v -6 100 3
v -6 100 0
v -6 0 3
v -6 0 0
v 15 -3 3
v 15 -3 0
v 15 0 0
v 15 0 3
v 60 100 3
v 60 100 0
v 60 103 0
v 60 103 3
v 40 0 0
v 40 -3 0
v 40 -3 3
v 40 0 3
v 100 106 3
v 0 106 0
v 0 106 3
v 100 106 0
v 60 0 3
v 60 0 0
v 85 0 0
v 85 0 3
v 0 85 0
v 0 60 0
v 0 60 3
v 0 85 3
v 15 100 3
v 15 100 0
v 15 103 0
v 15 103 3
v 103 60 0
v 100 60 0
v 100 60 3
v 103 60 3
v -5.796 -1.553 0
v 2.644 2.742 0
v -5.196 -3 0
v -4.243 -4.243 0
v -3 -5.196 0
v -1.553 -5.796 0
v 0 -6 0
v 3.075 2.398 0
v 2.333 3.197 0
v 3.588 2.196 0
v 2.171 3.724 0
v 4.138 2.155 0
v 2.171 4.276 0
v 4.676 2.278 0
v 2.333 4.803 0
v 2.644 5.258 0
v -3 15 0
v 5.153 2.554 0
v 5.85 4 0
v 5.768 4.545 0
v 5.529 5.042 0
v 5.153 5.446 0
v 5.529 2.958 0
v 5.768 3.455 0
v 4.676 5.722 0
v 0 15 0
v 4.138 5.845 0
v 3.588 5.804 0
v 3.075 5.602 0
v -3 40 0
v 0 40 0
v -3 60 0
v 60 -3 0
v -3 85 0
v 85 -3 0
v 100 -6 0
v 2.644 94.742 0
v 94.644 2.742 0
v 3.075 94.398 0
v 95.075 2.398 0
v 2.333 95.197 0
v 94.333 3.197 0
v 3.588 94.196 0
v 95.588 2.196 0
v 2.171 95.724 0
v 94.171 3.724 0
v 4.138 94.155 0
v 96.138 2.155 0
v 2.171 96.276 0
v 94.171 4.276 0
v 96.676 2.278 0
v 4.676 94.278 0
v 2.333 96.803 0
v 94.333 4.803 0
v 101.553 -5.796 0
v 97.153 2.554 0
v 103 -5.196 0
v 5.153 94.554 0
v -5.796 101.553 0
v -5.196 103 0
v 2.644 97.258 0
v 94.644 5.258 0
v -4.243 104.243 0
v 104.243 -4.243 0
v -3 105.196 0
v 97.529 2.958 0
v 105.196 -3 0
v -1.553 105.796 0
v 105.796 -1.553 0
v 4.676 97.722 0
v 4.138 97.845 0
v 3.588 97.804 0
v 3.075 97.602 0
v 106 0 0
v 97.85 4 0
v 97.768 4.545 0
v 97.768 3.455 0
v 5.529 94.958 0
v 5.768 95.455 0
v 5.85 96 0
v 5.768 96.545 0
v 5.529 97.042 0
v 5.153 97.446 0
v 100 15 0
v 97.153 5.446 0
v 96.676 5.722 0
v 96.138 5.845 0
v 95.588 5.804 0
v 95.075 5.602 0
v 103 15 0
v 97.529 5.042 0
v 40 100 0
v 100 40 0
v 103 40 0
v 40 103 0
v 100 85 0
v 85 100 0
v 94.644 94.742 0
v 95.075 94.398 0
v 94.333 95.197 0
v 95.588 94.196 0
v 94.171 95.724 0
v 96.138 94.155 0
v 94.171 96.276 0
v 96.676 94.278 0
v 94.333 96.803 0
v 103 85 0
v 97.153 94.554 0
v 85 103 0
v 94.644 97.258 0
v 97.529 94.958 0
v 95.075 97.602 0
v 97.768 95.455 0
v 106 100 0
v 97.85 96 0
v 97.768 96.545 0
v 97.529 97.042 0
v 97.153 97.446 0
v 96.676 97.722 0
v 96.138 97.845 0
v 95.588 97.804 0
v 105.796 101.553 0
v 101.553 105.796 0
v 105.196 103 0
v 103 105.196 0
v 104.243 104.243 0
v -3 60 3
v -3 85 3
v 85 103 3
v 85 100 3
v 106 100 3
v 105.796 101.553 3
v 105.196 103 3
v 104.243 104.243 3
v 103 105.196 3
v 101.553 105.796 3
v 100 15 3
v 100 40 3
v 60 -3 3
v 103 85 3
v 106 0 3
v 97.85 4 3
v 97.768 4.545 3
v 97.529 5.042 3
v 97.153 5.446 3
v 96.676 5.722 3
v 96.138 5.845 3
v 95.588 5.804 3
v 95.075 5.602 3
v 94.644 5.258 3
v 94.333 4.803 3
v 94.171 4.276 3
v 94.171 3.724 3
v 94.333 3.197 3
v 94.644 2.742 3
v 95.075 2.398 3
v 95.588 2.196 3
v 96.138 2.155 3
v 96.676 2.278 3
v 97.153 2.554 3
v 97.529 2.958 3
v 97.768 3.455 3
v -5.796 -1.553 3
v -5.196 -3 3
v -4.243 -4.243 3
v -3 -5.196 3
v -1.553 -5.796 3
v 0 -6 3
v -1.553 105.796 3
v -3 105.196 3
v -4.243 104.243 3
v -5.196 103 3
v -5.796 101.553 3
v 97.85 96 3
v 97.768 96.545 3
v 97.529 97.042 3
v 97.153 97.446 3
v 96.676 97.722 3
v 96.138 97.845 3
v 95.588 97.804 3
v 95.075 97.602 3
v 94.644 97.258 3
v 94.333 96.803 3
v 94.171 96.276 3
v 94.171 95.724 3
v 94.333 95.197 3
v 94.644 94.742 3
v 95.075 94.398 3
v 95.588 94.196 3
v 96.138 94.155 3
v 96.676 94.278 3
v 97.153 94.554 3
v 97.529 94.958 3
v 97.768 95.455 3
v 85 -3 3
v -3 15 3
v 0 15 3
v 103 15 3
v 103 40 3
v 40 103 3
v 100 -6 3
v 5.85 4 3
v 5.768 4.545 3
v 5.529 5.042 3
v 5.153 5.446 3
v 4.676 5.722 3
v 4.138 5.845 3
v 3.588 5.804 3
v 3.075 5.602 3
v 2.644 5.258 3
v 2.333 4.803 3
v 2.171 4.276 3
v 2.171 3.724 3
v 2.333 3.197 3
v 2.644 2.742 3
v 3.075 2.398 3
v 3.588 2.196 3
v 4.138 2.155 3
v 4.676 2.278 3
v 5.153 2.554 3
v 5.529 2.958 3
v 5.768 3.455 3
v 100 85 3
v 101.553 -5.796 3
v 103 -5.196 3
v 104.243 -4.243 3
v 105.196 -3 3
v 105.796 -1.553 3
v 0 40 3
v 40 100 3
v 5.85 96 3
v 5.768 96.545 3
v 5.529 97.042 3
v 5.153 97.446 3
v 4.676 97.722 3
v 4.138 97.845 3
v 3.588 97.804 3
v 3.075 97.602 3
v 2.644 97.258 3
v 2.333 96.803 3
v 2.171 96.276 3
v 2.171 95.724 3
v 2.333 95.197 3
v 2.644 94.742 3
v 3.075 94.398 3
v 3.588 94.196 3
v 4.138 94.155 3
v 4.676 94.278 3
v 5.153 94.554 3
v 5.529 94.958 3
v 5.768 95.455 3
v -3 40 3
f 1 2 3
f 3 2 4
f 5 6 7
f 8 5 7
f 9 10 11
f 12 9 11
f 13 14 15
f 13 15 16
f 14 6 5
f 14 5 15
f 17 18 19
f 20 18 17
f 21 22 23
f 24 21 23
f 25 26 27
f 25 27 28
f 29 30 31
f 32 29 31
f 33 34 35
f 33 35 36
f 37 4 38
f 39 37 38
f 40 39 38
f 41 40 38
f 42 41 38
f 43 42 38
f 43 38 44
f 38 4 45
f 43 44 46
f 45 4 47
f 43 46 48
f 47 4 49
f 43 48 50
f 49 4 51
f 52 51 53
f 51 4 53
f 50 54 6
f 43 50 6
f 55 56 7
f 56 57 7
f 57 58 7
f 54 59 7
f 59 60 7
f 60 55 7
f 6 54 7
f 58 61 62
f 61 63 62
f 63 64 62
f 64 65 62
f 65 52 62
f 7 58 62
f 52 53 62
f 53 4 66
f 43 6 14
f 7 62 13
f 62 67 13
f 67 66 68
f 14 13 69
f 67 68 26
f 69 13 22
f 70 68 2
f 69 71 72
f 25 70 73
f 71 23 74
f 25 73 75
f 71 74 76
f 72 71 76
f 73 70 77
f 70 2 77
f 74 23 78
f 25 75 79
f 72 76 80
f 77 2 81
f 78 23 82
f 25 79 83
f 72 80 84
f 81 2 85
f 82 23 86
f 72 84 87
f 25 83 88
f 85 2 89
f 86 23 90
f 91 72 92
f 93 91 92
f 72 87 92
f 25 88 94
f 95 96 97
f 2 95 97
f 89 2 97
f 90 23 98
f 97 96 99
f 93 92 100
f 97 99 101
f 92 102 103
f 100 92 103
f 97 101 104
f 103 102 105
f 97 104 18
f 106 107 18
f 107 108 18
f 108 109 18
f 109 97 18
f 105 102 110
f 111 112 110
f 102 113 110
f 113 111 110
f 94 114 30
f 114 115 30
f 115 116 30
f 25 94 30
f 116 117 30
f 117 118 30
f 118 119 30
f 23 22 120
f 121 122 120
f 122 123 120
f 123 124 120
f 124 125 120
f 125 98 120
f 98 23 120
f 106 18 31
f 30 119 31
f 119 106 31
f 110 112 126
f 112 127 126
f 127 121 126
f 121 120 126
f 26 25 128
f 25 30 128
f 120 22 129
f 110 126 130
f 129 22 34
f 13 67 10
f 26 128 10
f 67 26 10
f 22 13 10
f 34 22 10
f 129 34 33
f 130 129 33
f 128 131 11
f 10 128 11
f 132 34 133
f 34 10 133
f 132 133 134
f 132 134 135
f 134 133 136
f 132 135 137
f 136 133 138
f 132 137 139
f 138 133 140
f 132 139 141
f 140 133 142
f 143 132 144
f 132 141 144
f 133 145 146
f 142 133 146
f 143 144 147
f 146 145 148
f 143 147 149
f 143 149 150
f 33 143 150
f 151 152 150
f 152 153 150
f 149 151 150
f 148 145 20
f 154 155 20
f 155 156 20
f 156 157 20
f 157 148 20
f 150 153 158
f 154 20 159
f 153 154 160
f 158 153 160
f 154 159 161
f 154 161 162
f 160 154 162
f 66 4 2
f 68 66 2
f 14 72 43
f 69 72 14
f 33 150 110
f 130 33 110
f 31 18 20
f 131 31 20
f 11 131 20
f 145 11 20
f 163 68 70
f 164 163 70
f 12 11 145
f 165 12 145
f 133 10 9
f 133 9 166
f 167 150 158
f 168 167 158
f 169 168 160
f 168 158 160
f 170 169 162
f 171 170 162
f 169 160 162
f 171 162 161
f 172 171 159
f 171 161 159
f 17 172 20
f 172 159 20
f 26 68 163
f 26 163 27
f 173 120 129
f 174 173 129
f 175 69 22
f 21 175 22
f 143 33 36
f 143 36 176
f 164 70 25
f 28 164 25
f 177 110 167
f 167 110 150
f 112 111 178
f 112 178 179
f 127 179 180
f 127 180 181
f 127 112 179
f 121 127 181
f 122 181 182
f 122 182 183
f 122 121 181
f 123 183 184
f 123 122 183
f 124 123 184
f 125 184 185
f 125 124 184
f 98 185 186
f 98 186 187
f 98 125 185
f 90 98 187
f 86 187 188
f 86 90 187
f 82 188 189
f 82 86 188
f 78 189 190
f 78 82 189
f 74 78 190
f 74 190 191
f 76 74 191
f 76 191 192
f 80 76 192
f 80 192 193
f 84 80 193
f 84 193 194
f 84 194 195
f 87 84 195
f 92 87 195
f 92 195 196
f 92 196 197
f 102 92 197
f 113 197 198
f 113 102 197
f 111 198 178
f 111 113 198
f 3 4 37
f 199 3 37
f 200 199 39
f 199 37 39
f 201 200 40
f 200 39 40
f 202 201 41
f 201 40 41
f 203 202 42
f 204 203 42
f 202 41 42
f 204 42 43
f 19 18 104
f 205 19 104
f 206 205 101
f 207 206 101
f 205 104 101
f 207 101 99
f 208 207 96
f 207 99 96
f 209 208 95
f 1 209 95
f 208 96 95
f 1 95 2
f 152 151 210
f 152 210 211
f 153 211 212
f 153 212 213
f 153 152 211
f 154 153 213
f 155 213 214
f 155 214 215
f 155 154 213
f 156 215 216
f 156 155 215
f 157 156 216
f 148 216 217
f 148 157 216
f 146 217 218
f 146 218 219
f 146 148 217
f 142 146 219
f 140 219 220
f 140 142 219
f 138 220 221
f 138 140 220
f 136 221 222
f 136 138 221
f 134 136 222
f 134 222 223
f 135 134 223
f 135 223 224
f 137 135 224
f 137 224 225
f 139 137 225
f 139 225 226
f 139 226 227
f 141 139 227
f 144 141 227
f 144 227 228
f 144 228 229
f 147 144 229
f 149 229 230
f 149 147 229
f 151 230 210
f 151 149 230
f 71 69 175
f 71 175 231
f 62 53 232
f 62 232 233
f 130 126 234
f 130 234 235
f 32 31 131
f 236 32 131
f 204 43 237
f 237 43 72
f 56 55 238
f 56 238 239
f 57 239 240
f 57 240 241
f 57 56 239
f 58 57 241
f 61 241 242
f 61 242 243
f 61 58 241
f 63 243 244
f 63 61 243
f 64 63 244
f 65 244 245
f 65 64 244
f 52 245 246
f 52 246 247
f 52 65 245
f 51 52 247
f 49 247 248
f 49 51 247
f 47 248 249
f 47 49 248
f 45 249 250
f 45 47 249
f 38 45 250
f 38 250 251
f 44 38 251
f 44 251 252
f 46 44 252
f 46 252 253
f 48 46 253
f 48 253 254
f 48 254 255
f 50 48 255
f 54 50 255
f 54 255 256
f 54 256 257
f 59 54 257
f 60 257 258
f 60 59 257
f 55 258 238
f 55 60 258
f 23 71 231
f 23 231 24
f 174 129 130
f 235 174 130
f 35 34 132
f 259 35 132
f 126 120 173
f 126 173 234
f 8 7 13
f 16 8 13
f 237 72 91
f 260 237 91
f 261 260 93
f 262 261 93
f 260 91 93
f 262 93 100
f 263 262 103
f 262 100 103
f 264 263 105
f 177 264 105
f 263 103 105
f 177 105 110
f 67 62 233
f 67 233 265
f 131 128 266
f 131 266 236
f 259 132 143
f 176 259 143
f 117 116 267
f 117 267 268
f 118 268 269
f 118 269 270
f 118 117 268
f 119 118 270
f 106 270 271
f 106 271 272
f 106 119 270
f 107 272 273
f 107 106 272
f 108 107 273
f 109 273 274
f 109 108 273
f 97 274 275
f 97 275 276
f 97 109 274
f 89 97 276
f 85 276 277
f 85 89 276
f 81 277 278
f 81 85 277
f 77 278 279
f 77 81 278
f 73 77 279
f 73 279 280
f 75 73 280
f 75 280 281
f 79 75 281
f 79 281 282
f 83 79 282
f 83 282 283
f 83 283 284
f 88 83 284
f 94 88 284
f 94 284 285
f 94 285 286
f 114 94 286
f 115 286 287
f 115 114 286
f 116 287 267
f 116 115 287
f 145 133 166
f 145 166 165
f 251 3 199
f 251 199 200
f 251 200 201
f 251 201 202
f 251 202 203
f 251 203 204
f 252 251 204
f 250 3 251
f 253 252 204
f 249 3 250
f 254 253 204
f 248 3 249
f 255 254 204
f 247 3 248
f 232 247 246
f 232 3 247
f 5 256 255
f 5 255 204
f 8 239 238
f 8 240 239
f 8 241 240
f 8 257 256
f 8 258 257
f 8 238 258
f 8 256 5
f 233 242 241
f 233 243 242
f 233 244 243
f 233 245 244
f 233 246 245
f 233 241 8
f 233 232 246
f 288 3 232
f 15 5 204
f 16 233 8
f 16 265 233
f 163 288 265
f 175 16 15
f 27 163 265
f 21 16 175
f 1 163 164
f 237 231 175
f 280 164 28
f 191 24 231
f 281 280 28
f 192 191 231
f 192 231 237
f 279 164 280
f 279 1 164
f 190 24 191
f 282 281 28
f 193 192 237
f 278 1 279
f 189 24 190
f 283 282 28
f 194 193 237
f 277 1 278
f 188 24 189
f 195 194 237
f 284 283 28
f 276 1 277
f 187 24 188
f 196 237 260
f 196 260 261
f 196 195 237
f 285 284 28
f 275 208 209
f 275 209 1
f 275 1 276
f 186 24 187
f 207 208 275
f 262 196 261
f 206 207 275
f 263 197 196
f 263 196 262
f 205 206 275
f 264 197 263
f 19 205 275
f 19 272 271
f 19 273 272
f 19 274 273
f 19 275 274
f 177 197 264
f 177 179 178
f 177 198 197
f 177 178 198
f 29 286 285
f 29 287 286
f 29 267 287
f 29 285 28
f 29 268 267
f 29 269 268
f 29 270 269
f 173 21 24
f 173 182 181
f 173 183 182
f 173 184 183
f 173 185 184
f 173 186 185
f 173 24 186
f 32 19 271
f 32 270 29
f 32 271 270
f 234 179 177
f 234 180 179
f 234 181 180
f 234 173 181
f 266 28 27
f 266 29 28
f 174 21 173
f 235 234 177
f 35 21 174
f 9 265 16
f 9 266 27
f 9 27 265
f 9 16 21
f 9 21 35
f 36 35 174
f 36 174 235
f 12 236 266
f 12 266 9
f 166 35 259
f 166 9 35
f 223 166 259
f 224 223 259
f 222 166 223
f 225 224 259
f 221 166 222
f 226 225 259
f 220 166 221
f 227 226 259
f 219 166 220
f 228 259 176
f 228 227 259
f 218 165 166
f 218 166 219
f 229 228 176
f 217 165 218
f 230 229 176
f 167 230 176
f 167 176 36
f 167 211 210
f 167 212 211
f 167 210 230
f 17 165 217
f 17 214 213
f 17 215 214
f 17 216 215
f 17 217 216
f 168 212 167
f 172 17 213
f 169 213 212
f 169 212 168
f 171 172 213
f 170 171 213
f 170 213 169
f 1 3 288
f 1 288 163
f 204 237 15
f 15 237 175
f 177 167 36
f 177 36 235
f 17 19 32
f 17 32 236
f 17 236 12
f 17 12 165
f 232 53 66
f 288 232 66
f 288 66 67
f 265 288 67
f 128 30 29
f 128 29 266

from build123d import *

# Parameters (mm, degrees)
SKETCH_R      = 1.85
SKETCH_W      = 25
SKETCH_H      = 3
SKETCH_W_2    = 3
SKETCH_H_2    = 25
EXTRUDE_DEPTH = 3


with BuildPart() as part:
    # Sketch → Extrude (new body)
    with BuildSketch(Plane.XY):
        with BuildLine():
            ThreePointArc((0, 106), (-4.242641, 104.242641), (-6, 100))
            Line((-6, 100), (-6, 0))
            ThreePointArc((-6, 0), (-4.242641, -4.242641), (0, -6))
            Line((0, -6), (100, -6))
            ThreePointArc((100, -6), (104.242641, -4.242641), (106, 0))
            Line((106, 0), (106, 100))
            ThreePointArc((106, 100), (104.242641, 104.242641), (100, 106))
            Line((0, 106), (100, 106))
        make_face()
        with Locations((4, 96)):
            Circle(SKETCH_R, mode=Mode.SUBTRACT)
        with Locations((96, 96)):
            Circle(SKETCH_R, mode=Mode.SUBTRACT)
        with Locations((96, 4)):
            Circle(SKETCH_R, mode=Mode.SUBTRACT)
        with Locations((4, 4)):
            Circle(SKETCH_R, mode=Mode.SUBTRACT)
        with Locations((27.5, 101.5)):
            Rectangle(SKETCH_W, SKETCH_H, mode=Mode.SUBTRACT)
        with Locations((72.5, 101.5)):
            Rectangle(SKETCH_W, SKETCH_H, mode=Mode.SUBTRACT)
        with Locations((101.5, 72.5)):
            Rectangle(SKETCH_W_2, SKETCH_H_2, mode=Mode.SUBTRACT)
        with Locations((101.5, 27.5)):
            Rectangle(SKETCH_W_2, SKETCH_H_2, mode=Mode.SUBTRACT)
        with Locations((72.5, -1.5)):
            Rectangle(SKETCH_W, SKETCH_H, mode=Mode.SUBTRACT)
        with Locations((27.5, -1.5)):
            Rectangle(SKETCH_W, SKETCH_H, mode=Mode.SUBTRACT)
        with Locations((-1.5, 27.5)):
            Rectangle(SKETCH_W_2, SKETCH_H_2, mode=Mode.SUBTRACT)
        with Locations((-1.5, 72.5)):
            Rectangle(SKETCH_W_2, SKETCH_H_2, mode=Mode.SUBTRACT)
    extrude(amount=EXTRUDE_DEPTH)


solid = part.part
